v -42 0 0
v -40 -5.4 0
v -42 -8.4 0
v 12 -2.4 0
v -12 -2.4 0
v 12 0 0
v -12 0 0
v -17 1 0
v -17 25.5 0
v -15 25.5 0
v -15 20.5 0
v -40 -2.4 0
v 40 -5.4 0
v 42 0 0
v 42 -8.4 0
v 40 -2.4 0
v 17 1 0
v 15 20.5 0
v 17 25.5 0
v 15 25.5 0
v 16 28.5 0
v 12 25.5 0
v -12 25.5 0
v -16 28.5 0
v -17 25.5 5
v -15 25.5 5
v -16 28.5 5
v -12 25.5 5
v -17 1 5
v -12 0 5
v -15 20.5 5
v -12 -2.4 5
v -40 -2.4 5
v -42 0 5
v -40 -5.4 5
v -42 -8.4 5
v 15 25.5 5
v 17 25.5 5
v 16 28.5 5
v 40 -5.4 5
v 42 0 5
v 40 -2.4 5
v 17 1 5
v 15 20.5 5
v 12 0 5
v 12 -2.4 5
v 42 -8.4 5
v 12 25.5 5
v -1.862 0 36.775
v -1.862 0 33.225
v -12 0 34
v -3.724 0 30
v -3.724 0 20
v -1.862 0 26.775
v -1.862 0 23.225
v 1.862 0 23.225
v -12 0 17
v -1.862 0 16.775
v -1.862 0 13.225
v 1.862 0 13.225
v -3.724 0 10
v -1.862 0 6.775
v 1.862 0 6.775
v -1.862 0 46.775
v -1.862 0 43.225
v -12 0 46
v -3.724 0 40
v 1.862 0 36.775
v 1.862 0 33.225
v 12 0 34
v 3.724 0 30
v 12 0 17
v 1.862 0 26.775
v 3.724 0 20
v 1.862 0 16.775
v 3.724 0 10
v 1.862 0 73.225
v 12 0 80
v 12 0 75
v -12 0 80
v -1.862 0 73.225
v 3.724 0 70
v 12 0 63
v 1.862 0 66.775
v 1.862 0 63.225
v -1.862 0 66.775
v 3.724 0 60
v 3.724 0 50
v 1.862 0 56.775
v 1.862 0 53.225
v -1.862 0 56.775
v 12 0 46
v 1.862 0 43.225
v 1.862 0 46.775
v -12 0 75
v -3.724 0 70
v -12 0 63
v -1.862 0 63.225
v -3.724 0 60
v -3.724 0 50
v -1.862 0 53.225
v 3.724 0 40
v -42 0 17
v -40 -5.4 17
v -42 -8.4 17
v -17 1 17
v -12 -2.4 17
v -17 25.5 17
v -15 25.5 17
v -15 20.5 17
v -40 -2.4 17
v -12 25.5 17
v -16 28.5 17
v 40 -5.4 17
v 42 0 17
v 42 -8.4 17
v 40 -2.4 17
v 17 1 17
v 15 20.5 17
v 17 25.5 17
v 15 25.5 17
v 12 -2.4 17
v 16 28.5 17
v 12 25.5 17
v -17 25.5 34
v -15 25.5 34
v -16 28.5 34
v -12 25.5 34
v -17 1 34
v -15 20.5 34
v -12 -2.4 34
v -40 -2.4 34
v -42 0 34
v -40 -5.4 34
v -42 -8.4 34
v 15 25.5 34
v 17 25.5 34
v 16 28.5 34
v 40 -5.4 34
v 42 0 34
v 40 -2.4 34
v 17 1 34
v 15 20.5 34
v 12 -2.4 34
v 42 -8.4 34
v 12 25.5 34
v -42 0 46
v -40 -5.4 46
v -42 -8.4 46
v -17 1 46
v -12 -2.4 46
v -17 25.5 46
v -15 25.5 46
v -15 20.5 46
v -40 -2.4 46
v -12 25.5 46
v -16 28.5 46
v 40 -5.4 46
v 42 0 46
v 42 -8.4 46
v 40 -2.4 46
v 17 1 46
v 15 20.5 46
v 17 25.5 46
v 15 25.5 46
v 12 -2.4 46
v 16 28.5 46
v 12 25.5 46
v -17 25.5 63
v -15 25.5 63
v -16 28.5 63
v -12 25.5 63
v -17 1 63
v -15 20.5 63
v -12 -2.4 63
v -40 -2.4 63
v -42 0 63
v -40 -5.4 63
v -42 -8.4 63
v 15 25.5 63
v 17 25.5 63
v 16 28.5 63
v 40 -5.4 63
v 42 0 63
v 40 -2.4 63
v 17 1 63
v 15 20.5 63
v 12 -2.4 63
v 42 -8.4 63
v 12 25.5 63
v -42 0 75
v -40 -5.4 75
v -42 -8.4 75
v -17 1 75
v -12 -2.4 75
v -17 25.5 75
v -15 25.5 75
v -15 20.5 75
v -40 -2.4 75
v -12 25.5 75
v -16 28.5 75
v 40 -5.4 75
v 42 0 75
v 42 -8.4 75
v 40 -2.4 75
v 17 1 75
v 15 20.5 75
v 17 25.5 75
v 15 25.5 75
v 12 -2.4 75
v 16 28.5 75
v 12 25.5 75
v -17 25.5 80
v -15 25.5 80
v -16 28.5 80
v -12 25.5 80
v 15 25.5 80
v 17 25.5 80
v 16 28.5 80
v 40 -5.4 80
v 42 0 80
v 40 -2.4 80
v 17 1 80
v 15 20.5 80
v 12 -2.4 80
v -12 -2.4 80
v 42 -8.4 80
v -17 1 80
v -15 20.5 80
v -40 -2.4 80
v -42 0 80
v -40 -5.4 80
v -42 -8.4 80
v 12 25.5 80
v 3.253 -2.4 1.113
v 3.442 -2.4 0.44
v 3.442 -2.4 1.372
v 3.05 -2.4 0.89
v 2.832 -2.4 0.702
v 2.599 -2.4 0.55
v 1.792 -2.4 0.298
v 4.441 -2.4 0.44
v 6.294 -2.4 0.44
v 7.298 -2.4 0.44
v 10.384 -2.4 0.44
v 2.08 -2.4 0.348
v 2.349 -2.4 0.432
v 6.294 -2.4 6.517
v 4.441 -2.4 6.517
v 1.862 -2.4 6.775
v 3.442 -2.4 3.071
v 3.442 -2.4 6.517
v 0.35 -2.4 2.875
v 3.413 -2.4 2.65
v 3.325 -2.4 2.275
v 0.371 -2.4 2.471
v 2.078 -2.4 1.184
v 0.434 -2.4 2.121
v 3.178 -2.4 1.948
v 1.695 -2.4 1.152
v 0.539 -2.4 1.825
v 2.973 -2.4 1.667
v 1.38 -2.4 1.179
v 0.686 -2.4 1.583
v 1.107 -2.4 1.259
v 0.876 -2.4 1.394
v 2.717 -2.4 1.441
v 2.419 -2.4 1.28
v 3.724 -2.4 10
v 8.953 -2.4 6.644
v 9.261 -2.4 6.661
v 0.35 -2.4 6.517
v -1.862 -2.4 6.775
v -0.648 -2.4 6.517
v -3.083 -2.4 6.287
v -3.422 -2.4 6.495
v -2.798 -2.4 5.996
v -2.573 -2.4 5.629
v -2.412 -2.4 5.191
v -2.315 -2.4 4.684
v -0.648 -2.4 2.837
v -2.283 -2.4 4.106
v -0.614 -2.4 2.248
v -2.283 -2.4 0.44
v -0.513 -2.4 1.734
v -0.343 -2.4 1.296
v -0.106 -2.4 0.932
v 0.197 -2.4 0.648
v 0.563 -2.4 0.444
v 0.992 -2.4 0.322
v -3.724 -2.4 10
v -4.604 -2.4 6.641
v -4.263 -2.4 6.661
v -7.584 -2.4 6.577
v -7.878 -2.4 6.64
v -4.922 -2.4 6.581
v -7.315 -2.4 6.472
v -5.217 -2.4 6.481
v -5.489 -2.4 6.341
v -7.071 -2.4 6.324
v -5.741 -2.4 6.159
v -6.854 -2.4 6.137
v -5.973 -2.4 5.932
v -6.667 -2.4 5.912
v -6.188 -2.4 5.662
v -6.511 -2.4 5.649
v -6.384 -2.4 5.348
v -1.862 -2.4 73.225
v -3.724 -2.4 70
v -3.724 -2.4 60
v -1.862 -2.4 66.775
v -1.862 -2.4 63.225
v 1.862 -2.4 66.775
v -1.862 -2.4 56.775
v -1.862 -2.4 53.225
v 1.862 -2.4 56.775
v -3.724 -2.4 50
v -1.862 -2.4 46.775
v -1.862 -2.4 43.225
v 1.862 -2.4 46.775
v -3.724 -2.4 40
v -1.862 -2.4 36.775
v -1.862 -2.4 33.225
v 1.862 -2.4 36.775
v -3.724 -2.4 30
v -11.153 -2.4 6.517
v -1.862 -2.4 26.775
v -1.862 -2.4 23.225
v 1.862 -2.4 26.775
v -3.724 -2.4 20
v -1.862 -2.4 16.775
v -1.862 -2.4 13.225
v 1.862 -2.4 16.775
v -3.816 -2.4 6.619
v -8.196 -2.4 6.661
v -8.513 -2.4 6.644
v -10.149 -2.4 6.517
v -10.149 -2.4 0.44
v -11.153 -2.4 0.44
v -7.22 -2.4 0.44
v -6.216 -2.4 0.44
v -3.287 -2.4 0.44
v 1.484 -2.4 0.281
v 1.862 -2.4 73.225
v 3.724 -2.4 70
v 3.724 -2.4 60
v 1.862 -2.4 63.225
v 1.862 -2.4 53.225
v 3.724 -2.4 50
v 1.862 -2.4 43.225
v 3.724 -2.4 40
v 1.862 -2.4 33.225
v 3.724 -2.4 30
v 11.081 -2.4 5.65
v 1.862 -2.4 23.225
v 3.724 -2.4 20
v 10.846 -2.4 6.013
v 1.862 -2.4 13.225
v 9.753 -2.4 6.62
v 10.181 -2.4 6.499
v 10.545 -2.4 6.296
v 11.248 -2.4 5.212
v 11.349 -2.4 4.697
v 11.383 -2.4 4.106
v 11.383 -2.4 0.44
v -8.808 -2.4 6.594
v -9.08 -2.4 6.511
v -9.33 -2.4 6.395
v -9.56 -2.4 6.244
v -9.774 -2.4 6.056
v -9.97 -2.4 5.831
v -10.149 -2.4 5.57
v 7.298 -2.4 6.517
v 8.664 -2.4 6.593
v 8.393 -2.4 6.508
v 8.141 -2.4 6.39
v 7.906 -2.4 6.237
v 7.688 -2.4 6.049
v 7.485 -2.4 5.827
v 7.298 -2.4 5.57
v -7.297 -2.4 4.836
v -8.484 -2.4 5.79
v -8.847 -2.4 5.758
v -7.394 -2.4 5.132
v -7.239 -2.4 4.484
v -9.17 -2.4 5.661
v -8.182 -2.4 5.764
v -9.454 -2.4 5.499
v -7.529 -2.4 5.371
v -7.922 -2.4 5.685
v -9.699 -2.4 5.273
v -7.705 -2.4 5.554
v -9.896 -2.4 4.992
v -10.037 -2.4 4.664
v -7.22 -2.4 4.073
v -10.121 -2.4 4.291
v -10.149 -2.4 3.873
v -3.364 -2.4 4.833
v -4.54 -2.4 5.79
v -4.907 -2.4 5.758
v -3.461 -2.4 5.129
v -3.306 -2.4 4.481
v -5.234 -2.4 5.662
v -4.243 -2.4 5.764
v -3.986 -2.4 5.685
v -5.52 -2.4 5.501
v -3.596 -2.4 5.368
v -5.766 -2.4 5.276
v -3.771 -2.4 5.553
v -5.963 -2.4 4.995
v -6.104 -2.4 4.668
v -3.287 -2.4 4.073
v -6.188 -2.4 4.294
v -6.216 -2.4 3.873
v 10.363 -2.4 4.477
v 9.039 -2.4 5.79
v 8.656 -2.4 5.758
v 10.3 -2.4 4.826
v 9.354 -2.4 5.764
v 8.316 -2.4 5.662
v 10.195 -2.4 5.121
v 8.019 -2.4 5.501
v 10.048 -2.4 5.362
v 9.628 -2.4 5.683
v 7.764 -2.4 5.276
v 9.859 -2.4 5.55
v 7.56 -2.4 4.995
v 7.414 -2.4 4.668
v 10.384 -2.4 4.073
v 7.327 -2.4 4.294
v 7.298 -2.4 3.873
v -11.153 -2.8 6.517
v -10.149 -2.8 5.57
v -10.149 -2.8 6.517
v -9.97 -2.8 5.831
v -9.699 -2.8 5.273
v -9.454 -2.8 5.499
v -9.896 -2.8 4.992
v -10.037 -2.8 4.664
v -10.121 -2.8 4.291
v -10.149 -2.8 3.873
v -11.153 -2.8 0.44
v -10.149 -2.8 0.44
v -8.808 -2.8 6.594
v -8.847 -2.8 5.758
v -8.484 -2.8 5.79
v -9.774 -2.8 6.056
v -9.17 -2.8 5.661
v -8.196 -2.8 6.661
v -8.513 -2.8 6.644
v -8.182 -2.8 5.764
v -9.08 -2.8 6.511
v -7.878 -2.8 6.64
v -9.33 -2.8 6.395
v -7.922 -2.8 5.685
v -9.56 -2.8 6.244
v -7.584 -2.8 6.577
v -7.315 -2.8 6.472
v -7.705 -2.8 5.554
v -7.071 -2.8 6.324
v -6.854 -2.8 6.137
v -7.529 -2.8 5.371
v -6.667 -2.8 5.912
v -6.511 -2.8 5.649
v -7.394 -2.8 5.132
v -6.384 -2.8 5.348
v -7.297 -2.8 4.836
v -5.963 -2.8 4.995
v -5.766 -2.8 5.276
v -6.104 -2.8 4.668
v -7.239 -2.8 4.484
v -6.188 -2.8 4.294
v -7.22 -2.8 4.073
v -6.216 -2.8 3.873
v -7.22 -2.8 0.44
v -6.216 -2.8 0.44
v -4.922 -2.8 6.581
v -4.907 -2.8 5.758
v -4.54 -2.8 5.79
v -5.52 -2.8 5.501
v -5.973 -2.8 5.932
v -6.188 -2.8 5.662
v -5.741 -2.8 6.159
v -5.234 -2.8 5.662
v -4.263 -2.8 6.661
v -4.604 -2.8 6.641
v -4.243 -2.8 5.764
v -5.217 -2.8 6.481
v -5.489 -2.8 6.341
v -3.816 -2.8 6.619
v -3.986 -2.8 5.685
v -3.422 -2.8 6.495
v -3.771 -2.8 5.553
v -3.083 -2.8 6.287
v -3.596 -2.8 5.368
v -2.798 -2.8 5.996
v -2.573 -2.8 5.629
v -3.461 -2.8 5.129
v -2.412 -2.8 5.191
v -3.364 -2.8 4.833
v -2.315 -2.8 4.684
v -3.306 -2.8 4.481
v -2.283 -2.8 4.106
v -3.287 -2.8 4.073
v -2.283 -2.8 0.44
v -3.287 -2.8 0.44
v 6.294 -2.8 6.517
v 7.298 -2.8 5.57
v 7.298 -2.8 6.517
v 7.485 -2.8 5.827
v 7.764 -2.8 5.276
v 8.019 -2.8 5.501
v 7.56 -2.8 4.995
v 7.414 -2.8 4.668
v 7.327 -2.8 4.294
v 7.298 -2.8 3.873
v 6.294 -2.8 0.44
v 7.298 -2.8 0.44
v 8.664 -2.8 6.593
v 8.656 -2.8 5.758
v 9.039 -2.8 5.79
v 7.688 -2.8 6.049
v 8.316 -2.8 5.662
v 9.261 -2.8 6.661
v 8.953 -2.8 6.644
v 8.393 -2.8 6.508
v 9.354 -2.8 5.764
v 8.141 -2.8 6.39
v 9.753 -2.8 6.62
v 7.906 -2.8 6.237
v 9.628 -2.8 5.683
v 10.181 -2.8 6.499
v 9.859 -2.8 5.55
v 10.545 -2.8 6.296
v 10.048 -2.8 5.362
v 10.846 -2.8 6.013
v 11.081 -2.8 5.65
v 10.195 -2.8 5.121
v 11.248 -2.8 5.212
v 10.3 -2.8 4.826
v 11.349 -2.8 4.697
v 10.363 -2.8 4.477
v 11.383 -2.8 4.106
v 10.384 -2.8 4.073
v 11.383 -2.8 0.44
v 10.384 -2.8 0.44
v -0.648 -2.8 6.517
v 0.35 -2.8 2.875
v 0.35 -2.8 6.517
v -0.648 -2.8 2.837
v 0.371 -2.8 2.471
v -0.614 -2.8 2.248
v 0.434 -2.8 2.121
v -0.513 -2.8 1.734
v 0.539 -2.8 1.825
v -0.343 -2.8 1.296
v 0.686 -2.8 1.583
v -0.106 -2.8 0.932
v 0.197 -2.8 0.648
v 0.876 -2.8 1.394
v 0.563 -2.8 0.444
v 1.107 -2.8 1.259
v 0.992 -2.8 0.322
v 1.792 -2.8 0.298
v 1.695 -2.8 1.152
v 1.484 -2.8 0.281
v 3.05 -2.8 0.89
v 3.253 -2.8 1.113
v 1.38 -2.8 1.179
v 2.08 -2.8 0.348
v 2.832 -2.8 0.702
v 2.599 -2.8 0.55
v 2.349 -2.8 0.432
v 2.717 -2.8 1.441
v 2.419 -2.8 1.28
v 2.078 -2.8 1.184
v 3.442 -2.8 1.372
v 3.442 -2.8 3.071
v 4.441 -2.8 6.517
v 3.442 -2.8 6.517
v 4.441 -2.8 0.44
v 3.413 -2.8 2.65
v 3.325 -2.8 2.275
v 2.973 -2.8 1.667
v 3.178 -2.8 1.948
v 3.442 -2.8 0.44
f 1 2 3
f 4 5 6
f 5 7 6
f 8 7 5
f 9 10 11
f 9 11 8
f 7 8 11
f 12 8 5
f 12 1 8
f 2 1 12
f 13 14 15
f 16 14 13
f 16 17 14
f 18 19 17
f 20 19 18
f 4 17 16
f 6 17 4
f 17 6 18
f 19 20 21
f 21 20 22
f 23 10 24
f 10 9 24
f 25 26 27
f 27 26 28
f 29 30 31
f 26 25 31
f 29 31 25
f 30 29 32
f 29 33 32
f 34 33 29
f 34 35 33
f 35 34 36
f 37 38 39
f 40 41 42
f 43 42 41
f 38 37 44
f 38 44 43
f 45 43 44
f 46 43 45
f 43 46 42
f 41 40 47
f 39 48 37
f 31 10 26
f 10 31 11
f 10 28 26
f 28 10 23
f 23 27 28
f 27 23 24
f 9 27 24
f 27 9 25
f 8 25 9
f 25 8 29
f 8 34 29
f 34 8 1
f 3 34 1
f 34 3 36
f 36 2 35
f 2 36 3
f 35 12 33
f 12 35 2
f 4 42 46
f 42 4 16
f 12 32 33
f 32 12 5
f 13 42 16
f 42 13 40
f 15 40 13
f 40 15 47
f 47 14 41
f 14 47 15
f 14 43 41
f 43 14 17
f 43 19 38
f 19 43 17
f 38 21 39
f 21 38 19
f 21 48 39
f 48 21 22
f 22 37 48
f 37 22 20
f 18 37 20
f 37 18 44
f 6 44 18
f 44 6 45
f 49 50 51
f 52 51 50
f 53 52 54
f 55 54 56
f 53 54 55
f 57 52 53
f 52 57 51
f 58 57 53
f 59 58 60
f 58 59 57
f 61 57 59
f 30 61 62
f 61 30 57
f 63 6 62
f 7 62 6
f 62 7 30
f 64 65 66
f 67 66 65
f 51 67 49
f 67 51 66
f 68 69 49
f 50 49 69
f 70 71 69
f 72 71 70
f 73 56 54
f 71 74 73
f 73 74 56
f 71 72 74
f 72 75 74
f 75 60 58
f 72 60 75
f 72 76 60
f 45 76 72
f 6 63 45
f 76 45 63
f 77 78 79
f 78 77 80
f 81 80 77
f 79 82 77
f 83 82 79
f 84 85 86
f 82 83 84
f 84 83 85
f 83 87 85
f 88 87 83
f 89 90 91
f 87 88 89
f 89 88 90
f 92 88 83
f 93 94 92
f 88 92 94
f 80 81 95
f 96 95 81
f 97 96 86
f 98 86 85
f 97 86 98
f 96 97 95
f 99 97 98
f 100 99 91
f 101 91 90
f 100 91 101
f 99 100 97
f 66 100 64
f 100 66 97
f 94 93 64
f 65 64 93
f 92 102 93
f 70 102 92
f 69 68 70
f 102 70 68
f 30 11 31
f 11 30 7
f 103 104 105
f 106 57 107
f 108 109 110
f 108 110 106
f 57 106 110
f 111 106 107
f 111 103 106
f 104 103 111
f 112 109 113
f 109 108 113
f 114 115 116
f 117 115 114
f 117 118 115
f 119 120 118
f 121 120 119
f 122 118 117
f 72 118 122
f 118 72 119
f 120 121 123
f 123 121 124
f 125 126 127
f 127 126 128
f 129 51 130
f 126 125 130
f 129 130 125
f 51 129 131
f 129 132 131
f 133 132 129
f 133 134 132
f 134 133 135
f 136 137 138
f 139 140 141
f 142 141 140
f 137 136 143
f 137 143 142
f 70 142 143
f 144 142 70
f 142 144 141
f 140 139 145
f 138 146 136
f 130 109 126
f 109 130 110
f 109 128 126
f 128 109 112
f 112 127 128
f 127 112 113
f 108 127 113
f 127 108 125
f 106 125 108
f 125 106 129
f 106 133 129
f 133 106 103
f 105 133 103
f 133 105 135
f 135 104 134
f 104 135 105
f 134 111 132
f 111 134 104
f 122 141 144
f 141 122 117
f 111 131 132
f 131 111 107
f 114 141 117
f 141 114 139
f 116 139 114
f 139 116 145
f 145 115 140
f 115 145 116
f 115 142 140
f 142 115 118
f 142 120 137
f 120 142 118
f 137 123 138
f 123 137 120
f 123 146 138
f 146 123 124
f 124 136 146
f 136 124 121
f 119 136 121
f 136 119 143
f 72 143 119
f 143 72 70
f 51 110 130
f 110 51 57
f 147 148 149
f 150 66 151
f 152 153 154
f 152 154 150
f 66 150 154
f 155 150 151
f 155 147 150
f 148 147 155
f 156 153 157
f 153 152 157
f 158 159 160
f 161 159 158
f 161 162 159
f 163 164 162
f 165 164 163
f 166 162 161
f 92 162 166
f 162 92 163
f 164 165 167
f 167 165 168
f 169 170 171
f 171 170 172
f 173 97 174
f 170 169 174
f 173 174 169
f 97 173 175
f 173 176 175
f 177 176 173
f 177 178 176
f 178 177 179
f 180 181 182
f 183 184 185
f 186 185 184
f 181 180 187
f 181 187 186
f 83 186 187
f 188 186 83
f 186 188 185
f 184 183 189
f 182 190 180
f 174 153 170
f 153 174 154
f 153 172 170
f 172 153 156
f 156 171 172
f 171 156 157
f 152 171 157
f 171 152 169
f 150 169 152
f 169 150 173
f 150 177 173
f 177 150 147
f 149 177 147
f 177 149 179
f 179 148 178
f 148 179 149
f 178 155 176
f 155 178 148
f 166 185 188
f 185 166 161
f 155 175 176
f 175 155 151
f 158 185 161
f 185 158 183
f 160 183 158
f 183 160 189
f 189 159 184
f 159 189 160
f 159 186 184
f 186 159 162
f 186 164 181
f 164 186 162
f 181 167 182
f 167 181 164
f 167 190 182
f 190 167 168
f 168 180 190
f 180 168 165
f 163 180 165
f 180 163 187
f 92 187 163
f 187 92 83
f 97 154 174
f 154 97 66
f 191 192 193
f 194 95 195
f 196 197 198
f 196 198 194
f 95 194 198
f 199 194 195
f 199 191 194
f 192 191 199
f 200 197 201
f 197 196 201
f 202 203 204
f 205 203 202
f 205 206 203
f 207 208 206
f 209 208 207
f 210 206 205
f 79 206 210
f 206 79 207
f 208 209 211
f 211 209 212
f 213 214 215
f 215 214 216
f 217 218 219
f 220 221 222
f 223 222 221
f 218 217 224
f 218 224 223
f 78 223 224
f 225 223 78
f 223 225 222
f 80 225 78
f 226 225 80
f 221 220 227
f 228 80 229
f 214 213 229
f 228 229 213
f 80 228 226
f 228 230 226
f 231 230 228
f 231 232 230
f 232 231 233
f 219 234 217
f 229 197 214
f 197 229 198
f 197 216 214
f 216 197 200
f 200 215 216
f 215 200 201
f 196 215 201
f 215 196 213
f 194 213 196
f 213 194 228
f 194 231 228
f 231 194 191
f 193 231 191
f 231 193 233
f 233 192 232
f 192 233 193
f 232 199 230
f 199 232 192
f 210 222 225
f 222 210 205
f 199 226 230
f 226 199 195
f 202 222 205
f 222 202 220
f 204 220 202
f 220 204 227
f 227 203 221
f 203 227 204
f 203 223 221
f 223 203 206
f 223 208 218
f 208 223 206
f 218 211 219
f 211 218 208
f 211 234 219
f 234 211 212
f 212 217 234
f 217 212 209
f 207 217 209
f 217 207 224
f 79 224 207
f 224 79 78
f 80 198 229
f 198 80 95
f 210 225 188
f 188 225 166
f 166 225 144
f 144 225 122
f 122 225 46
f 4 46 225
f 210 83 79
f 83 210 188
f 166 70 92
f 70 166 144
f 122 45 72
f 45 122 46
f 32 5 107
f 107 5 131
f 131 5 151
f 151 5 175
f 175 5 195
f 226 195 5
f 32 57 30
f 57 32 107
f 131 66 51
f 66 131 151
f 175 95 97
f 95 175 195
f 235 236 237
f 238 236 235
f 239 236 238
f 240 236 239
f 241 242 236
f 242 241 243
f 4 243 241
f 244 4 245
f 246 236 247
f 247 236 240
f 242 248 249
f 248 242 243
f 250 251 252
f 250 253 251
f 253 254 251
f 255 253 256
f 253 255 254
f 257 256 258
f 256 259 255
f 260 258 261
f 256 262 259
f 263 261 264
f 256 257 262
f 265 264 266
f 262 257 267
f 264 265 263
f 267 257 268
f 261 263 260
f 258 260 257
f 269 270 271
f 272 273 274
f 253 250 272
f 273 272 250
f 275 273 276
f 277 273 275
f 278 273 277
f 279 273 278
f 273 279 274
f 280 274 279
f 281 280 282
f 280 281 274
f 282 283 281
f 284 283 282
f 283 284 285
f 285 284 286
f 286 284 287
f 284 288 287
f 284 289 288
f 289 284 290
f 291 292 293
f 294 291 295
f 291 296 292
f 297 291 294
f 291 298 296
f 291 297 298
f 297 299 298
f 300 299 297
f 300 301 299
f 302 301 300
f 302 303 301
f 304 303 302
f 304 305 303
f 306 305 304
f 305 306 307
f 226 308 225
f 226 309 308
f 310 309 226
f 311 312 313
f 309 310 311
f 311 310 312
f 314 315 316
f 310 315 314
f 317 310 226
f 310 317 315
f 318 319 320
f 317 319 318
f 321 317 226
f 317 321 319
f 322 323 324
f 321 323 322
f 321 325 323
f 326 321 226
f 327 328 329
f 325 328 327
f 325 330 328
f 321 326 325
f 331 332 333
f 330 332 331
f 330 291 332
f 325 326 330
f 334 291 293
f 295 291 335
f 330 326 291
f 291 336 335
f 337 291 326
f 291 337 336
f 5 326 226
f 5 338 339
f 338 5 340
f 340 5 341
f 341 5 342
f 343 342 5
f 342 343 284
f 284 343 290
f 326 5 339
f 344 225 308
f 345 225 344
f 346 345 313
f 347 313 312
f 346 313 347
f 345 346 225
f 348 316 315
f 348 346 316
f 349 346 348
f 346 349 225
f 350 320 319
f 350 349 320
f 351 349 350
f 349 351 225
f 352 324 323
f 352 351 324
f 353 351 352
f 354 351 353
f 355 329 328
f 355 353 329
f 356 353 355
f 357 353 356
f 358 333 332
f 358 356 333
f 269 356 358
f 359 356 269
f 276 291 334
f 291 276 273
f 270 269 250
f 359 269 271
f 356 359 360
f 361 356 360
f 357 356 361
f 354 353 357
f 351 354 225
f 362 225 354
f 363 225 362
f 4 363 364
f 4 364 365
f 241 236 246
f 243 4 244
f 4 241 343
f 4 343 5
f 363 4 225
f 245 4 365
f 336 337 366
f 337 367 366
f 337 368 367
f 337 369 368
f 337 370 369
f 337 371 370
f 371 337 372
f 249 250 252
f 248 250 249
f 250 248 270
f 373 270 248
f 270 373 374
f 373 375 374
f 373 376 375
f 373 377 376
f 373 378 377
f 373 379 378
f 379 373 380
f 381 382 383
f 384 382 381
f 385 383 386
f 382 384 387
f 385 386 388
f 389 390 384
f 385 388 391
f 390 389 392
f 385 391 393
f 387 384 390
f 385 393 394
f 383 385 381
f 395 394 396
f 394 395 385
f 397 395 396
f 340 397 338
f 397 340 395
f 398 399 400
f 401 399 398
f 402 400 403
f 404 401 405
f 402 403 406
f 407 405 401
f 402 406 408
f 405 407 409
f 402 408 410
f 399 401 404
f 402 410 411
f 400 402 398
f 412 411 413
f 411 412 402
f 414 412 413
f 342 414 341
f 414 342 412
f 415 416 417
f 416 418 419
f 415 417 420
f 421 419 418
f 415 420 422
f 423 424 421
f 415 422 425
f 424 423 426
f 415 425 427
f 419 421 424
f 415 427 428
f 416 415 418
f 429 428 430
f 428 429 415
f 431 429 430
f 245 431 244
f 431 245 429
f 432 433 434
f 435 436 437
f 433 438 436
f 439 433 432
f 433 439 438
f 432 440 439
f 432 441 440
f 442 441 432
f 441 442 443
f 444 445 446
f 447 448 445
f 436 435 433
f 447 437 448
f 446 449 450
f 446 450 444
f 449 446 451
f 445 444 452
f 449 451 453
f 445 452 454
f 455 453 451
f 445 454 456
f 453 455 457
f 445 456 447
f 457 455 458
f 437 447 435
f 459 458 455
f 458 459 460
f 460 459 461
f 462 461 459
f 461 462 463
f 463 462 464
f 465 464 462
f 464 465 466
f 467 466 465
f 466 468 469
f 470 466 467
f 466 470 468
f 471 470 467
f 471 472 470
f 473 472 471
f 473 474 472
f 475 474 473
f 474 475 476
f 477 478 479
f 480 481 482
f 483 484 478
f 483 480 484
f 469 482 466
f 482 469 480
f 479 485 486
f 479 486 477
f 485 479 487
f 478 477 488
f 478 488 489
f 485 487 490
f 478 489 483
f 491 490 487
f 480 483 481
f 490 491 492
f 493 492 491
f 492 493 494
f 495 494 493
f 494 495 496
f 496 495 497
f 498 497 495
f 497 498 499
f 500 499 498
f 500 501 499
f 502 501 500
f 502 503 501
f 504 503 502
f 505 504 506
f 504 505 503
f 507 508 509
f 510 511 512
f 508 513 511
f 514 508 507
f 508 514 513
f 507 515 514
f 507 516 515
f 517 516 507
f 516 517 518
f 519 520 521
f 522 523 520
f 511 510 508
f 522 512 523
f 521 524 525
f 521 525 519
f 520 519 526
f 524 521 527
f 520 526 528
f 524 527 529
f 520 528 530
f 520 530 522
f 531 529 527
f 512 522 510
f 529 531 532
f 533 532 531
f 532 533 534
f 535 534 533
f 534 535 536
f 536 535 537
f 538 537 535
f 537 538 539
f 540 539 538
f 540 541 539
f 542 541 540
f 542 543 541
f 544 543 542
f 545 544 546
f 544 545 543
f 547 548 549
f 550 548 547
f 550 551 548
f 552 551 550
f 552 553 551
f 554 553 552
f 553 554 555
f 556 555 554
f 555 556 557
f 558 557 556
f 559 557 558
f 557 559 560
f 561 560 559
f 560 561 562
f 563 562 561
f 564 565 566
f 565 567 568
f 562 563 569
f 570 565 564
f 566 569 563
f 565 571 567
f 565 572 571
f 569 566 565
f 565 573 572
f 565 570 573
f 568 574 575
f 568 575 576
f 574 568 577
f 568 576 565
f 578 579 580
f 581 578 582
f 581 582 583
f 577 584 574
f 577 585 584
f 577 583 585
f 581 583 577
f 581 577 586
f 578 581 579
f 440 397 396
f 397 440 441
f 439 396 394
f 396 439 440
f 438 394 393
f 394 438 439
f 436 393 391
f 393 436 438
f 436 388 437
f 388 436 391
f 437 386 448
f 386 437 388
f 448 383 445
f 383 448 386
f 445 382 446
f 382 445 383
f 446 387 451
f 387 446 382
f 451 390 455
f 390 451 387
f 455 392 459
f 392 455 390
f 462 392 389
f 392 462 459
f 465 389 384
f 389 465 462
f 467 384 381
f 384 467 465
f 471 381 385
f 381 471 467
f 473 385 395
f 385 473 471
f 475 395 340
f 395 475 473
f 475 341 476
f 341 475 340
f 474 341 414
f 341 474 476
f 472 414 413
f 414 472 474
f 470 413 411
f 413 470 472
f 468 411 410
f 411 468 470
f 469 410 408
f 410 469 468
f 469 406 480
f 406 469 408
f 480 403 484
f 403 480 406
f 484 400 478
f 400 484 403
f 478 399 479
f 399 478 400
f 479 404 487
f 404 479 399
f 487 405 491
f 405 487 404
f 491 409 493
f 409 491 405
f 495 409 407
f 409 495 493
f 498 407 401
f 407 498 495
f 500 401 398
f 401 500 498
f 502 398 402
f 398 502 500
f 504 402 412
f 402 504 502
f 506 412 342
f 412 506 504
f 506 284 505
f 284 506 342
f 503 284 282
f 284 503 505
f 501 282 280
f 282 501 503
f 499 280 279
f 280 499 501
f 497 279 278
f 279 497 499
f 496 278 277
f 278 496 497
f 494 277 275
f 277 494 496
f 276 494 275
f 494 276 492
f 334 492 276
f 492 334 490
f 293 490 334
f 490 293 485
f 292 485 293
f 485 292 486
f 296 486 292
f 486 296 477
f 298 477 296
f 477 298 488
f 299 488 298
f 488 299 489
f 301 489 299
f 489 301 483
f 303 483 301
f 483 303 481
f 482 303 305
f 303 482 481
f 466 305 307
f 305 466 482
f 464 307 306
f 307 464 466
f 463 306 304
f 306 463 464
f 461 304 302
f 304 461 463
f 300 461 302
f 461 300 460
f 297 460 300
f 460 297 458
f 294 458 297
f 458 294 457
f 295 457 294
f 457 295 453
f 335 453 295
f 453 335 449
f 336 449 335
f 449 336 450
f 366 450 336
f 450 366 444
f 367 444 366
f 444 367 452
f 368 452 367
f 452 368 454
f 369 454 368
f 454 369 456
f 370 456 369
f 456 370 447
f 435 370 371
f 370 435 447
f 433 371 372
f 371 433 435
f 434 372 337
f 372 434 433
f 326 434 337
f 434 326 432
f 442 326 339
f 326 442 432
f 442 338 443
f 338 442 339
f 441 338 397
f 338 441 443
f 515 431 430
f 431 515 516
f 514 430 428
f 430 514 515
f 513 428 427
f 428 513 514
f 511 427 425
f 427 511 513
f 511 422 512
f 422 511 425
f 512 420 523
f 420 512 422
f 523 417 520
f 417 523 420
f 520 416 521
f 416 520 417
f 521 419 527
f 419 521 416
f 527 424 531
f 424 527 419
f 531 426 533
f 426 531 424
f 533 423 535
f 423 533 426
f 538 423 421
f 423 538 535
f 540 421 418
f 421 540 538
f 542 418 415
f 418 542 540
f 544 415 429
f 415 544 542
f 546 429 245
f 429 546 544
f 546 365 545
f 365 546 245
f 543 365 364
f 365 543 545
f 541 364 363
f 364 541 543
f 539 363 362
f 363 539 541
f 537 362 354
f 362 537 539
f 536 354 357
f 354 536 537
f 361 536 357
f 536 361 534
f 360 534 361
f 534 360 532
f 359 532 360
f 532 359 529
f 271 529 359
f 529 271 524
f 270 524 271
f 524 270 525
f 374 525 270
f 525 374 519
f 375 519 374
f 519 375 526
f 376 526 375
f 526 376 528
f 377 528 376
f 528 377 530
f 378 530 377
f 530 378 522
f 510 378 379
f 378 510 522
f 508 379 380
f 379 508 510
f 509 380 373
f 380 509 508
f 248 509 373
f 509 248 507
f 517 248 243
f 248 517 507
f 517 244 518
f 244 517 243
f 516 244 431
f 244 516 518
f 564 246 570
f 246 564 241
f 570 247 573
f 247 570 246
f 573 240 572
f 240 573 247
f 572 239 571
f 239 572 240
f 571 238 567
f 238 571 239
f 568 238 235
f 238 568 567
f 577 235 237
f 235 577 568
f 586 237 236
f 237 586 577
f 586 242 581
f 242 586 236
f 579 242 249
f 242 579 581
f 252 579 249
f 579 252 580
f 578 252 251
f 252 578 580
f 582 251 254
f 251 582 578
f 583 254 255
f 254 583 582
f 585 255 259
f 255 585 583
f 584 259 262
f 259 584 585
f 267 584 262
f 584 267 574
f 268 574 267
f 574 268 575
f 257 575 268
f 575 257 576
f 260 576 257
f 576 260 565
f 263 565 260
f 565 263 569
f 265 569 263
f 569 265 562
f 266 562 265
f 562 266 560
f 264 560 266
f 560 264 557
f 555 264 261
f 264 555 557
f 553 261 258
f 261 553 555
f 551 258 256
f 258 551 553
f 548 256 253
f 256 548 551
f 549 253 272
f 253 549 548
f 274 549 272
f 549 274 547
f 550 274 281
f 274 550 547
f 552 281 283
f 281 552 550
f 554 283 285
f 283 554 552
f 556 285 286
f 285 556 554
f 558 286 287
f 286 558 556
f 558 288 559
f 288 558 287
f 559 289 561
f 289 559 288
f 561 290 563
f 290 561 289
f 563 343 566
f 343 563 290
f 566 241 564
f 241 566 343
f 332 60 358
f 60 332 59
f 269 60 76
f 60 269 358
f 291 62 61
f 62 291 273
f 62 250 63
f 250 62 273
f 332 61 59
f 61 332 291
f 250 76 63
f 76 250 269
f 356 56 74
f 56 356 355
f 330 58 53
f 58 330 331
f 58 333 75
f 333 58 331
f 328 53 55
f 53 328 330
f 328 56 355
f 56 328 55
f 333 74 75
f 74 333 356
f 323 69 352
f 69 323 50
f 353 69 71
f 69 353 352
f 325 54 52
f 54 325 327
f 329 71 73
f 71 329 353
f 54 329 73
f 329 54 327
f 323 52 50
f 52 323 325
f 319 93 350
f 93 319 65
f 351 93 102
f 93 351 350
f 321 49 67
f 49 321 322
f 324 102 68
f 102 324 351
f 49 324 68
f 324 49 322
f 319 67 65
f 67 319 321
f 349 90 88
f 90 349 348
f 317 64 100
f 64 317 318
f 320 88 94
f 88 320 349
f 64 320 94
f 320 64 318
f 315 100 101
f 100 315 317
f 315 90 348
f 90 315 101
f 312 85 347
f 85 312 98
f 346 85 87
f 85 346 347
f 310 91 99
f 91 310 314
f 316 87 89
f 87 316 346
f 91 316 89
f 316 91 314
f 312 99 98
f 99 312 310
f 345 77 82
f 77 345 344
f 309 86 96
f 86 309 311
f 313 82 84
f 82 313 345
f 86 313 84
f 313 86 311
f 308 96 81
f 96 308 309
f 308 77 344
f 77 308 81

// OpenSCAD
// A clip on addition for the Raaco Open ToolBox (Product Id: 137195)
// This is a screwdrver holder made to clip over the compartments to the right of the handle.

wing = 25;
open = 30;
seat = 24;
clip = 2;
dep  = 25.5;
prong = clip;
wall = 2.4;

/*

Plan for the poly, is just half to be mirrored

<prong>
|\
| |_____________________
|__________     ________0,0        | wall
  <wing>   |   /   <seat/2     |
           |  /               dep (inside the clip)
           | |   <open/2       |
           | |_                |
           \__/

           clip (thinnest part)

*/


side_shape = [
    [0, 0], 
    [(seat/2), 0],
    [(open/2), dep - 5],
    [(open/2), dep],
    [(open/2) - 3, dep],
    [(open/2) + (clip/2), dep + 3],
    [(open/2) + clip, dep],
    [(open/2) + clip, 1],
    [(open/2) + clip + wing, 0],
    [(open/2) + clip + wing, -wall -6],
    [(open/2) + clip + wing - prong, -wall -3],
    [(open/2) + clip + wing - prong, -wall],
    [0, -wall],

];

module sect(th) {
linear_extrude(th)
union() {
    polygon(side_shape);
    mirror([1,0,0]) polygon(side_shape);
};
};



module hex(){
    hex_size = 6.35;
    clearance = 0.1;
    size = hex_size + clearance;
    rotate([90,0,0]) cylinder(d=size/cos(30), h=30, $fn=6);
}

module stamp(){
translate([0,-0.8,0]) rotate([90,0,0]) linear_extrude(2) text("mun", size = 8, halign = "center", valign = "center", font = "ProggyClean Nerd Font" );
}


edge = 5;
gap = 12;
inter = 17;
difference() {
union() {
translate([0,0,0]) sect(edge);
translate([0,0,edge+gap]) sect(inter);
translate([0,0,edge+gap+inter+gap]) sect(inter);
translate([0,0,edge+gap+inter+gap+inter+gap]) sect(edge);
translate([-seat/2,-wall,0]) cube([seat, wall, 80]);
translate([0,0,3.4]) stamp();
};
union(){
translate([0,10,10]) hex();
translate([0,10,20]) hex();
translate([0,10,30]) hex();
translate([0,10,40]) hex();
translate([0,10,50]) hex();
translate([0,10,60]) hex();
translate([0,10,70]) hex();
}
}
